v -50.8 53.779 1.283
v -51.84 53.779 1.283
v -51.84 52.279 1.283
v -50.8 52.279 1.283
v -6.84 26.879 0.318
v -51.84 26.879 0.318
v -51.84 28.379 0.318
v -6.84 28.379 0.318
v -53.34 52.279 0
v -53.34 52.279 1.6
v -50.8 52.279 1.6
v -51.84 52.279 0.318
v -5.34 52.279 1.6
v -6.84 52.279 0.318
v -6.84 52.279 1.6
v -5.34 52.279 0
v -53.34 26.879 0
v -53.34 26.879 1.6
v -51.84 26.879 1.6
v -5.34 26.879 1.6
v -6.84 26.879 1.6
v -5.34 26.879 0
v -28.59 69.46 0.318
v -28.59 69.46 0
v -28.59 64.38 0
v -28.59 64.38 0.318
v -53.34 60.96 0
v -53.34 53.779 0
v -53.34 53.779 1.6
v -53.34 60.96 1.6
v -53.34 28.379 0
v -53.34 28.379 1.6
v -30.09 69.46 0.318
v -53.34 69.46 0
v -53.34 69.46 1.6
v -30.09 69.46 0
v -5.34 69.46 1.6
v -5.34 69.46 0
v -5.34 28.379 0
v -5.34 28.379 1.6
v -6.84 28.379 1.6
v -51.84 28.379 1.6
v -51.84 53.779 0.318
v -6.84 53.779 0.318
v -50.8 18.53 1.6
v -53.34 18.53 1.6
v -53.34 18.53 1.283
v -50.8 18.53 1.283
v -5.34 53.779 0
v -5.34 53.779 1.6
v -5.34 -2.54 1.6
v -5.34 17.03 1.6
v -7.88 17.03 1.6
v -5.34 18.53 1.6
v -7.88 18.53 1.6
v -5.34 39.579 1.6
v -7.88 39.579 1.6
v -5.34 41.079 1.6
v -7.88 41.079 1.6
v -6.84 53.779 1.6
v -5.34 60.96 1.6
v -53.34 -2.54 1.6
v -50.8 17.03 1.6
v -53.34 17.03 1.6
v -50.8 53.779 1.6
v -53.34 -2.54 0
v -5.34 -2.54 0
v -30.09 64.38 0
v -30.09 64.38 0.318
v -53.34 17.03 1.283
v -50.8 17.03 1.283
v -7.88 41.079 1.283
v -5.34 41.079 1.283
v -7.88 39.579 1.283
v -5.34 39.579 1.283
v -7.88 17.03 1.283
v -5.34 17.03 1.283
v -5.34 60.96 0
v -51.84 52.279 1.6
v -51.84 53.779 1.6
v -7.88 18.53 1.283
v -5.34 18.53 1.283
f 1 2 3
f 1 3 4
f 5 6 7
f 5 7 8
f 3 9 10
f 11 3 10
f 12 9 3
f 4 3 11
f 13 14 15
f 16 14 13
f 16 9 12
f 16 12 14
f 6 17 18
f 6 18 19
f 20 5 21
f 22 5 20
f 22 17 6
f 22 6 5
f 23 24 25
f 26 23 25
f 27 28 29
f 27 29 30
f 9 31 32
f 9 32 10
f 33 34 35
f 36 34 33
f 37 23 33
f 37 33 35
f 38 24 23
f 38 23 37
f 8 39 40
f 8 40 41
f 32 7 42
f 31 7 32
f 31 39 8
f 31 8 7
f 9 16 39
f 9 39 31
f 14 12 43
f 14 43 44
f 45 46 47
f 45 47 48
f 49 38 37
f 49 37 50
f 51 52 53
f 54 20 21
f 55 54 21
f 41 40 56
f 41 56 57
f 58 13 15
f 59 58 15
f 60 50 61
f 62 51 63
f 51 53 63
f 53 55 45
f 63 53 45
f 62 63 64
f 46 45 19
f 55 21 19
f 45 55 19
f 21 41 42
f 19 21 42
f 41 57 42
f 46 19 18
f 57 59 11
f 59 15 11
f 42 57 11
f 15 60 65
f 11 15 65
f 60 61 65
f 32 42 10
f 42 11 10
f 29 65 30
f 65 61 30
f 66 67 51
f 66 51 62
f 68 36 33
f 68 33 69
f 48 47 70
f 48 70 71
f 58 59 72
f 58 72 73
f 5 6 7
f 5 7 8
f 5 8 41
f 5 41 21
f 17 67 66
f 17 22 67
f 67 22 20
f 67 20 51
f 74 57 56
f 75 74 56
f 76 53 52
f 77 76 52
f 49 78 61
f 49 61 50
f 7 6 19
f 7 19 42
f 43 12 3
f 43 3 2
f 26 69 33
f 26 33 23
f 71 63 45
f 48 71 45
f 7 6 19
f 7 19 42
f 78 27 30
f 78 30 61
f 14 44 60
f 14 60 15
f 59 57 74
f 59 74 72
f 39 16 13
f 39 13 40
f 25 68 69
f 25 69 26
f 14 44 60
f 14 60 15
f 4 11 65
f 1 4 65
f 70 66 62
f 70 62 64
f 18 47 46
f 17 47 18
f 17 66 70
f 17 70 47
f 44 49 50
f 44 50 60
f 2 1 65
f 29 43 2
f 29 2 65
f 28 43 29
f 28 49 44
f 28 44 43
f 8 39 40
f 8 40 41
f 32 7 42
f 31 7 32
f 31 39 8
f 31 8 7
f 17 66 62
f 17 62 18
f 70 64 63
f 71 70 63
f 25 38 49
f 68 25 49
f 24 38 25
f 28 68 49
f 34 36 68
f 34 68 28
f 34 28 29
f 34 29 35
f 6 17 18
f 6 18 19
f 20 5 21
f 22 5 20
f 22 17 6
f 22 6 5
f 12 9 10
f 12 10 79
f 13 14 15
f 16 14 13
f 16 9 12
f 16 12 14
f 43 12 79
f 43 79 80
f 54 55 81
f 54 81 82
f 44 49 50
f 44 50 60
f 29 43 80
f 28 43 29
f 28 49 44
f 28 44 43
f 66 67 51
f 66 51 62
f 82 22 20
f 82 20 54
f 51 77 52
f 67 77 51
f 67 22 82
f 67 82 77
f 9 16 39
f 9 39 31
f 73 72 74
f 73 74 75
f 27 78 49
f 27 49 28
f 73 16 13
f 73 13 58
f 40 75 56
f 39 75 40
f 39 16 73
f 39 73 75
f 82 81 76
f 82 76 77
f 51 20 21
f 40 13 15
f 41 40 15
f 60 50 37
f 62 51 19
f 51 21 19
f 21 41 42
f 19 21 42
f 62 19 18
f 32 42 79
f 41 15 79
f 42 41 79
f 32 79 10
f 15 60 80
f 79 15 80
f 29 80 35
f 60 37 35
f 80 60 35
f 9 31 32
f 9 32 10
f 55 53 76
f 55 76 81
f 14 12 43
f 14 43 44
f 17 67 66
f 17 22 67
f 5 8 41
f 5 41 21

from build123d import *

# Parameters (mm, degrees)
PAD_DEPTH       = 1.6
SKETCH002_W     = 45
SKETCH002_H     = 1.5
POCKET_DEPTH    = 0.3175
SKETCH004_W     = 1.04
SKETCH004_H     = 1.5
SKETCH004_W_2   = 2.54
POCKET002_DEPTH = 0.3175
PAD001_DEPTH    = 1.6
SKETCH003_W     = 45
SKETCH003_H     = 1.5
SKETCH003_W_2   = 1.5
SKETCH003_H_2   = 5.08
POCKET001_DEPTH = 0.3175


with BuildPart() as short_pcb:
    # Sketch → Pad (new body)
    with BuildSketch(Plane.XY):
        Polygon((-53.34, -2.54), (-53.34, 26.87934), (-51.84, 26.87934), (-51.84, 28.37934), (-53.34, 28.37934), (-53.34, 52.27934), (-51.84, 52.27934), (-51.84, 53.77934), (-53.34, 53.77934), (-53.34, 60.96), (-5.34, 60.96), (-5.34, 53.77934), (-6.84, 53.77934), (-6.84, 52.27934), (-5.34, 52.27934), (-5.34, 28.37934), (-6.84, 28.37934), (-6.84, 26.87934), (-5.34, 26.87934), (-5.34, -2.54), align=None)
    extrude(amount=PAD_DEPTH)

    # Sketch002 (on Face21 of Pad) → Pocket (cut)
    with BuildSketch(Plane(origin=(0, 0, 0), x_dir=(1, 0, 0), z_dir=(0, 0, -1))):
        with Locations((-29.34, -53.02934)):
            Rectangle(SKETCH002_W, SKETCH002_H)
        with Locations((-29.34, -27.62934)):
            Rectangle(SKETCH002_W, SKETCH002_H)
    extrude(amount=-POCKET_DEPTH, mode=Mode.SUBTRACT)

    # Sketch004 (on Face5 of Pocket) → Pocket002 (cut)
    with BuildSketch(Plane.XY.offset(1.6)):
        with Locations((-51.32, 53.02934)):
            Rectangle(SKETCH004_W, SKETCH004_H)
        with Locations((-6.61, 40.32934)):
            Rectangle(SKETCH004_W_2, SKETCH004_H)
        with Locations((-52.07, 17.78)):
            Rectangle(SKETCH004_W_2, SKETCH004_H)
        with Locations((-6.61, 17.78)):
            Rectangle(SKETCH004_W_2, SKETCH004_H)
    extrude(amount=-POCKET002_DEPTH, mode=Mode.SUBTRACT)


with BuildPart() as long_pcb:
    # Sketch001 → Pad001 (new body)
    with BuildSketch(Plane.XY):
        Polygon((-53.34, -2.54), (-53.34, 26.87934), (-51.84, 26.87934), (-51.84, 28.37934), (-53.34, 28.37934), (-53.34, 52.27934), (-51.84, 52.27934), (-51.84, 53.77934), (-53.34, 53.77934), (-53.34, 69.46), (-5.34, 69.46), (-5.34, 53.77934), (-6.84, 53.77934), (-6.84, 52.27934), (-5.34, 52.27934), (-5.34, 28.37934), (-6.84, 28.37934), (-6.84, 26.87934), (-5.34, 26.87934), (-5.34, -2.54), align=None)
    extrude(amount=PAD001_DEPTH)

    # Sketch003 (on Face21 of Pad001) → Pocket001 (cut)
    with BuildSketch(Plane(origin=(0, 0, 0), x_dir=(1, 0, 0), z_dir=(0, 0, -1))):
        with Locations((-29.34, -53.02934)):
            Rectangle(SKETCH003_W, SKETCH003_H)
        with Locations((-29.34, -27.62934)):
            Rectangle(SKETCH003_W, SKETCH003_H)
        with Locations((-29.34, -66.92)):
            Rectangle(SKETCH003_W_2, SKETCH003_H_2)
    extrude(amount=-POCKET001_DEPTH, mode=Mode.SUBTRACT)


solid = Compound([short_pcb.part, long_pcb.part])
